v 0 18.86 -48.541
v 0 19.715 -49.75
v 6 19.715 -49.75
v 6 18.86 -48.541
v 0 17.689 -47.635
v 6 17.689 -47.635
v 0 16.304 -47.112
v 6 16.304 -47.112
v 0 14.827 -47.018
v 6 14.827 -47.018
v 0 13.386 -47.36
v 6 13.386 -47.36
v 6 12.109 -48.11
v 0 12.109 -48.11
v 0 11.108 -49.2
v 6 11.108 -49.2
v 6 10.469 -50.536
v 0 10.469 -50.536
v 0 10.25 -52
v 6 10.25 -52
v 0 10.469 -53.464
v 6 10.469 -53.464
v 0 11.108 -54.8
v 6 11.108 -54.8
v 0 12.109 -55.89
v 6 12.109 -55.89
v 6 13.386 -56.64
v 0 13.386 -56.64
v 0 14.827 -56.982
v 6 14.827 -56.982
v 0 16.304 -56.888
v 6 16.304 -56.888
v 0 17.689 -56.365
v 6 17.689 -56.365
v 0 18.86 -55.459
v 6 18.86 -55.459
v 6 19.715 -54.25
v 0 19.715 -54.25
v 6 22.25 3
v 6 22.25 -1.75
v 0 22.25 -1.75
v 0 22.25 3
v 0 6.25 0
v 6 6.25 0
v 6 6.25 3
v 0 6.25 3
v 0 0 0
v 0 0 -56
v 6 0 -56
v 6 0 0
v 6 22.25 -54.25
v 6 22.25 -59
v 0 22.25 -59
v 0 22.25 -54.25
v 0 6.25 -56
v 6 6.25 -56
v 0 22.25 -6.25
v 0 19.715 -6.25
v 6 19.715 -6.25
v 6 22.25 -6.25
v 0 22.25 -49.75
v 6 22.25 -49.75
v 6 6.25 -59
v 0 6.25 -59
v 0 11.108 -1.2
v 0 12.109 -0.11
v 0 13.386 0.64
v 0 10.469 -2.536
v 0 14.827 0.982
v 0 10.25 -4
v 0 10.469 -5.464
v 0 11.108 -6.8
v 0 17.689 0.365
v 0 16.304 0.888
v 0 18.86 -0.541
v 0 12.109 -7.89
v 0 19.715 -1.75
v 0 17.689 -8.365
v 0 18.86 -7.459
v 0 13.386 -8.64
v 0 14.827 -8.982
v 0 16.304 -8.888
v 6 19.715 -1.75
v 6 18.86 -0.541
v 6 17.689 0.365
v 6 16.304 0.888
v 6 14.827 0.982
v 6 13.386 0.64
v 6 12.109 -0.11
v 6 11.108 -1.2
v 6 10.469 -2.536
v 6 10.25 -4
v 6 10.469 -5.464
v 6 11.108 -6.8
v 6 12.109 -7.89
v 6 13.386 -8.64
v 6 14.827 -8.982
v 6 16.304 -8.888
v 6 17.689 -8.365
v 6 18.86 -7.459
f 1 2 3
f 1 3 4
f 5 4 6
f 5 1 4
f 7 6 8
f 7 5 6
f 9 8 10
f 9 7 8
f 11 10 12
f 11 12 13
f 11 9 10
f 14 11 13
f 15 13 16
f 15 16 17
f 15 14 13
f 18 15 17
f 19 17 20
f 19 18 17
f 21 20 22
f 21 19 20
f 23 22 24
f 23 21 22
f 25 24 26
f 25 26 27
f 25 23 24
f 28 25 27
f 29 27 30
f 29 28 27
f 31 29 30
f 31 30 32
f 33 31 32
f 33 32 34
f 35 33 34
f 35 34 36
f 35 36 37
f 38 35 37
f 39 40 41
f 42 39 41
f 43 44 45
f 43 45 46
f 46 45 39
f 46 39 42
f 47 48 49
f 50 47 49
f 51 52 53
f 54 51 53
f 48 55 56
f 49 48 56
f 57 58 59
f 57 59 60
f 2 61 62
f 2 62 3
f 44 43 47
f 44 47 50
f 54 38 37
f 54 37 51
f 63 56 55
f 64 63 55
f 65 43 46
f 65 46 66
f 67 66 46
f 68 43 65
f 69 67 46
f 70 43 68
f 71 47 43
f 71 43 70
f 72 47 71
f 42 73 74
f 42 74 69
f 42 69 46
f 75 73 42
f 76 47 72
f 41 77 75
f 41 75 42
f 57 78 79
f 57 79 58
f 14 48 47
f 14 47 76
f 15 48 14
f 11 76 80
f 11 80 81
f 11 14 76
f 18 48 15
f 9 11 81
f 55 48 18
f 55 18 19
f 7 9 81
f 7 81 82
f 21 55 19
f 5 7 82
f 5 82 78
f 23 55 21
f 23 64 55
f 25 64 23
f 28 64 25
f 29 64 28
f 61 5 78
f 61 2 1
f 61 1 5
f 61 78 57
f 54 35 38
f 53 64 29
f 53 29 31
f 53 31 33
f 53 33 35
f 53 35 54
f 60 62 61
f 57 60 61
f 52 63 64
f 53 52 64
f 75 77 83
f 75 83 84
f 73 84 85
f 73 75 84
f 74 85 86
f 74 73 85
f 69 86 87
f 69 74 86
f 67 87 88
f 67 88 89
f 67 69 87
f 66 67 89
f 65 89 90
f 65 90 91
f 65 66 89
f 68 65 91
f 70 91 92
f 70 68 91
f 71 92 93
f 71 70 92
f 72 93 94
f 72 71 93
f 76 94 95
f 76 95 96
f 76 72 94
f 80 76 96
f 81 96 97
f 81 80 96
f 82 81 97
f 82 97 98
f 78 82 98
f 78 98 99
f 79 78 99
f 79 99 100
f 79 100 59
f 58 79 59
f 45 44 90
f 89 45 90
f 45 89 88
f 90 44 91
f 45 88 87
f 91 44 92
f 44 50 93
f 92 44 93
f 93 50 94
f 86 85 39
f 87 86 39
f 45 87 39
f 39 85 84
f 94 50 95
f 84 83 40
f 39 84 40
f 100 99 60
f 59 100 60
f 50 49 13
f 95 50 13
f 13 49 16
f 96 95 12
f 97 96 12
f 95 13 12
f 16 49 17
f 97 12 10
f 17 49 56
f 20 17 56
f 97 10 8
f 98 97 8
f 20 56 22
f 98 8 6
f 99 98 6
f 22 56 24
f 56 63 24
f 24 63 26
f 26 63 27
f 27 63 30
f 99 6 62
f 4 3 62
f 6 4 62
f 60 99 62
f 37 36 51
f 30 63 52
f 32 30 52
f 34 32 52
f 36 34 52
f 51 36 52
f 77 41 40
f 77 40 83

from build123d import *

# Parameters (mm, degrees)
SKETCH1_W           = 6
SKETCH1_H           = 56
BOSS_EXTRUDE1_DEPTH = 22.25
SKETCH6_W           = 6
SKETCH6_H           = 16
BOSS_EXTRUDE3_DEPTH = 3
CUT_EXTRUDE1_DEPTH  = 6


with BuildPart() as part:
    # Sketch1 → Boss-Extrude1 (new body)
    with BuildSketch(Plane(origin=(0, 0, 0), x_dir=(1, 0, 0), z_dir=(0, 1, 0))):
        with Locations((3, 28)):
            Rectangle(SKETCH1_W, SKETCH1_H)
    extrude(amount=BOSS_EXTRUDE1_DEPTH)

    # Sketch6 → Boss-Extrude3 (add)
    with BuildSketch(Plane(origin=(0, 0, -56), x_dir=(-1, 0, 0), z_dir=(0, 0, -1))):
        with Locations((-3, 14.25)):
            Rectangle(SKETCH6_W, SKETCH6_H)
    boss_extrude3 = extrude(amount=BOSS_EXTRUDE3_DEPTH)

    # Mirror3: Boss-Extrude3 across plane
    add(boss_extrude3.mirror(Plane(origin=(0, 0, -28), x_dir=(1, 0, 0), z_dir=(0, 0, -1))))

    # Sketch7 → Cut-Extrude1 (cut)
    with BuildSketch(Plane.ZY):
        with BuildLine():
            Line((-54.25, 19.715142775), (-54.25, 24.715142775))
            Line((-54.25, 24.715142775), (-49.75, 24.715142775))
            Line((-49.75, 24.715142775), (-49.75, 19.715142775))
            ThreePointArc((-49.75, 19.715142775), (-52, 10.25), (-54.25, 19.715142775))
        make_face()
        with BuildLine():
            Line((-6.25, 19.715142775), (-6.25, 24.715142775))
            Line((-6.25, 24.715142775), (-1.75, 24.715142775))
            Line((-1.75, 24.715142775), (-1.75, 19.715142775))
            ThreePointArc((-1.75, 19.715142775), (-4, 10.25), (-6.25, 19.715142775))
        make_face()
    extrude(amount=-CUT_EXTRUDE1_DEPTH, mode=Mode.SUBTRACT)


solid = part.part
